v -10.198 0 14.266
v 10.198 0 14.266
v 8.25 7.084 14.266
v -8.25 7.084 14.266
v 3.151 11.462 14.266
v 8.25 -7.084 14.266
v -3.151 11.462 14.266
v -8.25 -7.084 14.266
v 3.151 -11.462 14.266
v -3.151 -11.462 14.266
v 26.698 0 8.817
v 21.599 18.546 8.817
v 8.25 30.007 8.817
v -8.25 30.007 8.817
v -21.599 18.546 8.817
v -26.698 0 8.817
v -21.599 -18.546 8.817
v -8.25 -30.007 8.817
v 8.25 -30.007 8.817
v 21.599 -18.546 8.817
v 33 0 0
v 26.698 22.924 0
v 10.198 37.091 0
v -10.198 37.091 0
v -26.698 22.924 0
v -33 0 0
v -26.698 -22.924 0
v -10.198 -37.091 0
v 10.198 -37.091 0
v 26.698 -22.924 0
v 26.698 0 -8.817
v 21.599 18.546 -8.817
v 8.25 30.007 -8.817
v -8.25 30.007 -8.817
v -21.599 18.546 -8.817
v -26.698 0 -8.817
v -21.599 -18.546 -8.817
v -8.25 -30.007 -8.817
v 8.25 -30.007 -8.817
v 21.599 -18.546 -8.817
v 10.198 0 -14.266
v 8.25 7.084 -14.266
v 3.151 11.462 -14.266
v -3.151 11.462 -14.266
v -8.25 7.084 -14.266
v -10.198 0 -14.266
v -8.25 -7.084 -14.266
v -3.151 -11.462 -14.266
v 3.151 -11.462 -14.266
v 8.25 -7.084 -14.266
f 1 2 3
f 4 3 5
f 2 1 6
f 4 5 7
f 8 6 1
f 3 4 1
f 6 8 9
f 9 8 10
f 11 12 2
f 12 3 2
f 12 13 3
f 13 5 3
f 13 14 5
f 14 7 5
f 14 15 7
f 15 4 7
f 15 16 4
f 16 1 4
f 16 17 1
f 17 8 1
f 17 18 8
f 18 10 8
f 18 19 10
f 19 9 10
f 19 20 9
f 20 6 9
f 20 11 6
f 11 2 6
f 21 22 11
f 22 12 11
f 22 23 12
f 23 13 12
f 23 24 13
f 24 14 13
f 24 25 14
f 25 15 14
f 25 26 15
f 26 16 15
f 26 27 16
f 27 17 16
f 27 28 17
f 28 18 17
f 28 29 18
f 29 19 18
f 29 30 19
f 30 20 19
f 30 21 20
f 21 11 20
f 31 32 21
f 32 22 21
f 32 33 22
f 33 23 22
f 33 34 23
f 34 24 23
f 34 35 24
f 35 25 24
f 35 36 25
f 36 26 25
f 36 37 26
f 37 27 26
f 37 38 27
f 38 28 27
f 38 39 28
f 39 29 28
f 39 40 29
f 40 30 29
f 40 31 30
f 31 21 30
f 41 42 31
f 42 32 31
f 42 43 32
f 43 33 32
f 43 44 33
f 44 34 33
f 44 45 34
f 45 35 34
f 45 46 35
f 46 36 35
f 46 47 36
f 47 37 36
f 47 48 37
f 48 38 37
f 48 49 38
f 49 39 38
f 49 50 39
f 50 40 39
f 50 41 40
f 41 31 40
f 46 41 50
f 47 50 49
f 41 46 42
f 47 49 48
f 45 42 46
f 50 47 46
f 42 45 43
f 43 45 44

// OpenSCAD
// Generated by SolidPython 1.0.1 on 2020-07-29 00:46:49


scale(v = [11, 13, 5]) {
	sphere(r = 3);
}
/***********************************************
*********      SolidPython code:      **********
************************************************
 
# import packages: SolidPython
from solid import *
from solid.utils import *
from itertools import chain, combinations, permutations


class Resize:

    def __init__(self, scad_file):
        self.scad_file = scad_file
        #self.scad_file = import_scad(scad_file)
        # cone/cylinder param:
        self.r1 = 0
        self.r2 = 0
        self.h = 0
        # rectangular prism param:
        self.w = 0
        self.l = 0
        # ellipse param:
        self.r = 0

    # import OpenScad code (file name corresponds to shape)


    # classify shape + parameters
    def assign(self, param1, param2, param3):
        if self.scad_file == 'cone.scad':
            self.r1 = param1
            self.r2 = param2
            self.h = param3
        elif self.scad_file == 'cylinder.scad':
            self.r1 = param1
            self.r2 = param2
            self.h = param3
        elif self.scad_file == 'rectangularPrism.scad':
            self.h = param1
            self.l = param2
            self.w = param3
        else:
            self.r = param1
            self.h = param2

    # resize parameters
    def iterate(self):
        x = range(3, 20, 2)
        i = 1
        if self.scad_file == 'cone.scad':
            tempList = list(permutations(x, 2))
            for temp in tempList:
                param1 = temp[0]
                param2 = temp[1]
                filepath = 'produced_scad_files/' + 'cone' + str(param1) + '_' + str(param2) + '_' + '.scad'
                scad_render_to_file(cylinder(h=param1, r1=param2, r2=0), filepath)

        elif self.scad_file == 'cylinder.scad':
            tempList = list(permutations(x, 3))
            for temp in tempList:
                param1 = temp[0]
                param2 = temp[1]
                filepath = 'produced_scad_files/' + 'cylinder' + str(param1) + '_' + str(param2) + '_' + '.scad'
                scad_render_to_file(cylinder(h=param1, r1=param2, r2=param2), filepath)

        elif self.scad_file == 'rectangularPrism.scad':
            tempList = list(permutations(x, 3))
            for temp in tempList:
                param1 = temp[0]
                param2 = temp[1]
                param3 = temp[2]
                filepath = 'produced_scad_files/' + 'rectangularPrism' + str(param1) + '_' + str(param2) + '_' + str(
                    param3) + '.scad'
                scad_render_to_file(cube(size=(param1, param2, param3)), filepath)

        elif self.scad_file == 'ellipse.scad':
            tempList = list(permutations(x, 4))
            for temp in tempList:
                param1 = temp[0]
                param2 = temp[1]
                param3 = temp[2]
                param4 = temp[3]
                filepath = 'produced_scad_files/' + 'ellipse' + str(param1) + '_' + str(param2) + '_' + str(param3) + '_' + str(param4) + '.scad'
                scad_render_to_file(scale([param1, param2, param3])(sphere(r=param4)), filepath)

    def render_to_scadfile(self):
        scad_render_to_file(scad, 'example.scad') 
 
************************************************/
